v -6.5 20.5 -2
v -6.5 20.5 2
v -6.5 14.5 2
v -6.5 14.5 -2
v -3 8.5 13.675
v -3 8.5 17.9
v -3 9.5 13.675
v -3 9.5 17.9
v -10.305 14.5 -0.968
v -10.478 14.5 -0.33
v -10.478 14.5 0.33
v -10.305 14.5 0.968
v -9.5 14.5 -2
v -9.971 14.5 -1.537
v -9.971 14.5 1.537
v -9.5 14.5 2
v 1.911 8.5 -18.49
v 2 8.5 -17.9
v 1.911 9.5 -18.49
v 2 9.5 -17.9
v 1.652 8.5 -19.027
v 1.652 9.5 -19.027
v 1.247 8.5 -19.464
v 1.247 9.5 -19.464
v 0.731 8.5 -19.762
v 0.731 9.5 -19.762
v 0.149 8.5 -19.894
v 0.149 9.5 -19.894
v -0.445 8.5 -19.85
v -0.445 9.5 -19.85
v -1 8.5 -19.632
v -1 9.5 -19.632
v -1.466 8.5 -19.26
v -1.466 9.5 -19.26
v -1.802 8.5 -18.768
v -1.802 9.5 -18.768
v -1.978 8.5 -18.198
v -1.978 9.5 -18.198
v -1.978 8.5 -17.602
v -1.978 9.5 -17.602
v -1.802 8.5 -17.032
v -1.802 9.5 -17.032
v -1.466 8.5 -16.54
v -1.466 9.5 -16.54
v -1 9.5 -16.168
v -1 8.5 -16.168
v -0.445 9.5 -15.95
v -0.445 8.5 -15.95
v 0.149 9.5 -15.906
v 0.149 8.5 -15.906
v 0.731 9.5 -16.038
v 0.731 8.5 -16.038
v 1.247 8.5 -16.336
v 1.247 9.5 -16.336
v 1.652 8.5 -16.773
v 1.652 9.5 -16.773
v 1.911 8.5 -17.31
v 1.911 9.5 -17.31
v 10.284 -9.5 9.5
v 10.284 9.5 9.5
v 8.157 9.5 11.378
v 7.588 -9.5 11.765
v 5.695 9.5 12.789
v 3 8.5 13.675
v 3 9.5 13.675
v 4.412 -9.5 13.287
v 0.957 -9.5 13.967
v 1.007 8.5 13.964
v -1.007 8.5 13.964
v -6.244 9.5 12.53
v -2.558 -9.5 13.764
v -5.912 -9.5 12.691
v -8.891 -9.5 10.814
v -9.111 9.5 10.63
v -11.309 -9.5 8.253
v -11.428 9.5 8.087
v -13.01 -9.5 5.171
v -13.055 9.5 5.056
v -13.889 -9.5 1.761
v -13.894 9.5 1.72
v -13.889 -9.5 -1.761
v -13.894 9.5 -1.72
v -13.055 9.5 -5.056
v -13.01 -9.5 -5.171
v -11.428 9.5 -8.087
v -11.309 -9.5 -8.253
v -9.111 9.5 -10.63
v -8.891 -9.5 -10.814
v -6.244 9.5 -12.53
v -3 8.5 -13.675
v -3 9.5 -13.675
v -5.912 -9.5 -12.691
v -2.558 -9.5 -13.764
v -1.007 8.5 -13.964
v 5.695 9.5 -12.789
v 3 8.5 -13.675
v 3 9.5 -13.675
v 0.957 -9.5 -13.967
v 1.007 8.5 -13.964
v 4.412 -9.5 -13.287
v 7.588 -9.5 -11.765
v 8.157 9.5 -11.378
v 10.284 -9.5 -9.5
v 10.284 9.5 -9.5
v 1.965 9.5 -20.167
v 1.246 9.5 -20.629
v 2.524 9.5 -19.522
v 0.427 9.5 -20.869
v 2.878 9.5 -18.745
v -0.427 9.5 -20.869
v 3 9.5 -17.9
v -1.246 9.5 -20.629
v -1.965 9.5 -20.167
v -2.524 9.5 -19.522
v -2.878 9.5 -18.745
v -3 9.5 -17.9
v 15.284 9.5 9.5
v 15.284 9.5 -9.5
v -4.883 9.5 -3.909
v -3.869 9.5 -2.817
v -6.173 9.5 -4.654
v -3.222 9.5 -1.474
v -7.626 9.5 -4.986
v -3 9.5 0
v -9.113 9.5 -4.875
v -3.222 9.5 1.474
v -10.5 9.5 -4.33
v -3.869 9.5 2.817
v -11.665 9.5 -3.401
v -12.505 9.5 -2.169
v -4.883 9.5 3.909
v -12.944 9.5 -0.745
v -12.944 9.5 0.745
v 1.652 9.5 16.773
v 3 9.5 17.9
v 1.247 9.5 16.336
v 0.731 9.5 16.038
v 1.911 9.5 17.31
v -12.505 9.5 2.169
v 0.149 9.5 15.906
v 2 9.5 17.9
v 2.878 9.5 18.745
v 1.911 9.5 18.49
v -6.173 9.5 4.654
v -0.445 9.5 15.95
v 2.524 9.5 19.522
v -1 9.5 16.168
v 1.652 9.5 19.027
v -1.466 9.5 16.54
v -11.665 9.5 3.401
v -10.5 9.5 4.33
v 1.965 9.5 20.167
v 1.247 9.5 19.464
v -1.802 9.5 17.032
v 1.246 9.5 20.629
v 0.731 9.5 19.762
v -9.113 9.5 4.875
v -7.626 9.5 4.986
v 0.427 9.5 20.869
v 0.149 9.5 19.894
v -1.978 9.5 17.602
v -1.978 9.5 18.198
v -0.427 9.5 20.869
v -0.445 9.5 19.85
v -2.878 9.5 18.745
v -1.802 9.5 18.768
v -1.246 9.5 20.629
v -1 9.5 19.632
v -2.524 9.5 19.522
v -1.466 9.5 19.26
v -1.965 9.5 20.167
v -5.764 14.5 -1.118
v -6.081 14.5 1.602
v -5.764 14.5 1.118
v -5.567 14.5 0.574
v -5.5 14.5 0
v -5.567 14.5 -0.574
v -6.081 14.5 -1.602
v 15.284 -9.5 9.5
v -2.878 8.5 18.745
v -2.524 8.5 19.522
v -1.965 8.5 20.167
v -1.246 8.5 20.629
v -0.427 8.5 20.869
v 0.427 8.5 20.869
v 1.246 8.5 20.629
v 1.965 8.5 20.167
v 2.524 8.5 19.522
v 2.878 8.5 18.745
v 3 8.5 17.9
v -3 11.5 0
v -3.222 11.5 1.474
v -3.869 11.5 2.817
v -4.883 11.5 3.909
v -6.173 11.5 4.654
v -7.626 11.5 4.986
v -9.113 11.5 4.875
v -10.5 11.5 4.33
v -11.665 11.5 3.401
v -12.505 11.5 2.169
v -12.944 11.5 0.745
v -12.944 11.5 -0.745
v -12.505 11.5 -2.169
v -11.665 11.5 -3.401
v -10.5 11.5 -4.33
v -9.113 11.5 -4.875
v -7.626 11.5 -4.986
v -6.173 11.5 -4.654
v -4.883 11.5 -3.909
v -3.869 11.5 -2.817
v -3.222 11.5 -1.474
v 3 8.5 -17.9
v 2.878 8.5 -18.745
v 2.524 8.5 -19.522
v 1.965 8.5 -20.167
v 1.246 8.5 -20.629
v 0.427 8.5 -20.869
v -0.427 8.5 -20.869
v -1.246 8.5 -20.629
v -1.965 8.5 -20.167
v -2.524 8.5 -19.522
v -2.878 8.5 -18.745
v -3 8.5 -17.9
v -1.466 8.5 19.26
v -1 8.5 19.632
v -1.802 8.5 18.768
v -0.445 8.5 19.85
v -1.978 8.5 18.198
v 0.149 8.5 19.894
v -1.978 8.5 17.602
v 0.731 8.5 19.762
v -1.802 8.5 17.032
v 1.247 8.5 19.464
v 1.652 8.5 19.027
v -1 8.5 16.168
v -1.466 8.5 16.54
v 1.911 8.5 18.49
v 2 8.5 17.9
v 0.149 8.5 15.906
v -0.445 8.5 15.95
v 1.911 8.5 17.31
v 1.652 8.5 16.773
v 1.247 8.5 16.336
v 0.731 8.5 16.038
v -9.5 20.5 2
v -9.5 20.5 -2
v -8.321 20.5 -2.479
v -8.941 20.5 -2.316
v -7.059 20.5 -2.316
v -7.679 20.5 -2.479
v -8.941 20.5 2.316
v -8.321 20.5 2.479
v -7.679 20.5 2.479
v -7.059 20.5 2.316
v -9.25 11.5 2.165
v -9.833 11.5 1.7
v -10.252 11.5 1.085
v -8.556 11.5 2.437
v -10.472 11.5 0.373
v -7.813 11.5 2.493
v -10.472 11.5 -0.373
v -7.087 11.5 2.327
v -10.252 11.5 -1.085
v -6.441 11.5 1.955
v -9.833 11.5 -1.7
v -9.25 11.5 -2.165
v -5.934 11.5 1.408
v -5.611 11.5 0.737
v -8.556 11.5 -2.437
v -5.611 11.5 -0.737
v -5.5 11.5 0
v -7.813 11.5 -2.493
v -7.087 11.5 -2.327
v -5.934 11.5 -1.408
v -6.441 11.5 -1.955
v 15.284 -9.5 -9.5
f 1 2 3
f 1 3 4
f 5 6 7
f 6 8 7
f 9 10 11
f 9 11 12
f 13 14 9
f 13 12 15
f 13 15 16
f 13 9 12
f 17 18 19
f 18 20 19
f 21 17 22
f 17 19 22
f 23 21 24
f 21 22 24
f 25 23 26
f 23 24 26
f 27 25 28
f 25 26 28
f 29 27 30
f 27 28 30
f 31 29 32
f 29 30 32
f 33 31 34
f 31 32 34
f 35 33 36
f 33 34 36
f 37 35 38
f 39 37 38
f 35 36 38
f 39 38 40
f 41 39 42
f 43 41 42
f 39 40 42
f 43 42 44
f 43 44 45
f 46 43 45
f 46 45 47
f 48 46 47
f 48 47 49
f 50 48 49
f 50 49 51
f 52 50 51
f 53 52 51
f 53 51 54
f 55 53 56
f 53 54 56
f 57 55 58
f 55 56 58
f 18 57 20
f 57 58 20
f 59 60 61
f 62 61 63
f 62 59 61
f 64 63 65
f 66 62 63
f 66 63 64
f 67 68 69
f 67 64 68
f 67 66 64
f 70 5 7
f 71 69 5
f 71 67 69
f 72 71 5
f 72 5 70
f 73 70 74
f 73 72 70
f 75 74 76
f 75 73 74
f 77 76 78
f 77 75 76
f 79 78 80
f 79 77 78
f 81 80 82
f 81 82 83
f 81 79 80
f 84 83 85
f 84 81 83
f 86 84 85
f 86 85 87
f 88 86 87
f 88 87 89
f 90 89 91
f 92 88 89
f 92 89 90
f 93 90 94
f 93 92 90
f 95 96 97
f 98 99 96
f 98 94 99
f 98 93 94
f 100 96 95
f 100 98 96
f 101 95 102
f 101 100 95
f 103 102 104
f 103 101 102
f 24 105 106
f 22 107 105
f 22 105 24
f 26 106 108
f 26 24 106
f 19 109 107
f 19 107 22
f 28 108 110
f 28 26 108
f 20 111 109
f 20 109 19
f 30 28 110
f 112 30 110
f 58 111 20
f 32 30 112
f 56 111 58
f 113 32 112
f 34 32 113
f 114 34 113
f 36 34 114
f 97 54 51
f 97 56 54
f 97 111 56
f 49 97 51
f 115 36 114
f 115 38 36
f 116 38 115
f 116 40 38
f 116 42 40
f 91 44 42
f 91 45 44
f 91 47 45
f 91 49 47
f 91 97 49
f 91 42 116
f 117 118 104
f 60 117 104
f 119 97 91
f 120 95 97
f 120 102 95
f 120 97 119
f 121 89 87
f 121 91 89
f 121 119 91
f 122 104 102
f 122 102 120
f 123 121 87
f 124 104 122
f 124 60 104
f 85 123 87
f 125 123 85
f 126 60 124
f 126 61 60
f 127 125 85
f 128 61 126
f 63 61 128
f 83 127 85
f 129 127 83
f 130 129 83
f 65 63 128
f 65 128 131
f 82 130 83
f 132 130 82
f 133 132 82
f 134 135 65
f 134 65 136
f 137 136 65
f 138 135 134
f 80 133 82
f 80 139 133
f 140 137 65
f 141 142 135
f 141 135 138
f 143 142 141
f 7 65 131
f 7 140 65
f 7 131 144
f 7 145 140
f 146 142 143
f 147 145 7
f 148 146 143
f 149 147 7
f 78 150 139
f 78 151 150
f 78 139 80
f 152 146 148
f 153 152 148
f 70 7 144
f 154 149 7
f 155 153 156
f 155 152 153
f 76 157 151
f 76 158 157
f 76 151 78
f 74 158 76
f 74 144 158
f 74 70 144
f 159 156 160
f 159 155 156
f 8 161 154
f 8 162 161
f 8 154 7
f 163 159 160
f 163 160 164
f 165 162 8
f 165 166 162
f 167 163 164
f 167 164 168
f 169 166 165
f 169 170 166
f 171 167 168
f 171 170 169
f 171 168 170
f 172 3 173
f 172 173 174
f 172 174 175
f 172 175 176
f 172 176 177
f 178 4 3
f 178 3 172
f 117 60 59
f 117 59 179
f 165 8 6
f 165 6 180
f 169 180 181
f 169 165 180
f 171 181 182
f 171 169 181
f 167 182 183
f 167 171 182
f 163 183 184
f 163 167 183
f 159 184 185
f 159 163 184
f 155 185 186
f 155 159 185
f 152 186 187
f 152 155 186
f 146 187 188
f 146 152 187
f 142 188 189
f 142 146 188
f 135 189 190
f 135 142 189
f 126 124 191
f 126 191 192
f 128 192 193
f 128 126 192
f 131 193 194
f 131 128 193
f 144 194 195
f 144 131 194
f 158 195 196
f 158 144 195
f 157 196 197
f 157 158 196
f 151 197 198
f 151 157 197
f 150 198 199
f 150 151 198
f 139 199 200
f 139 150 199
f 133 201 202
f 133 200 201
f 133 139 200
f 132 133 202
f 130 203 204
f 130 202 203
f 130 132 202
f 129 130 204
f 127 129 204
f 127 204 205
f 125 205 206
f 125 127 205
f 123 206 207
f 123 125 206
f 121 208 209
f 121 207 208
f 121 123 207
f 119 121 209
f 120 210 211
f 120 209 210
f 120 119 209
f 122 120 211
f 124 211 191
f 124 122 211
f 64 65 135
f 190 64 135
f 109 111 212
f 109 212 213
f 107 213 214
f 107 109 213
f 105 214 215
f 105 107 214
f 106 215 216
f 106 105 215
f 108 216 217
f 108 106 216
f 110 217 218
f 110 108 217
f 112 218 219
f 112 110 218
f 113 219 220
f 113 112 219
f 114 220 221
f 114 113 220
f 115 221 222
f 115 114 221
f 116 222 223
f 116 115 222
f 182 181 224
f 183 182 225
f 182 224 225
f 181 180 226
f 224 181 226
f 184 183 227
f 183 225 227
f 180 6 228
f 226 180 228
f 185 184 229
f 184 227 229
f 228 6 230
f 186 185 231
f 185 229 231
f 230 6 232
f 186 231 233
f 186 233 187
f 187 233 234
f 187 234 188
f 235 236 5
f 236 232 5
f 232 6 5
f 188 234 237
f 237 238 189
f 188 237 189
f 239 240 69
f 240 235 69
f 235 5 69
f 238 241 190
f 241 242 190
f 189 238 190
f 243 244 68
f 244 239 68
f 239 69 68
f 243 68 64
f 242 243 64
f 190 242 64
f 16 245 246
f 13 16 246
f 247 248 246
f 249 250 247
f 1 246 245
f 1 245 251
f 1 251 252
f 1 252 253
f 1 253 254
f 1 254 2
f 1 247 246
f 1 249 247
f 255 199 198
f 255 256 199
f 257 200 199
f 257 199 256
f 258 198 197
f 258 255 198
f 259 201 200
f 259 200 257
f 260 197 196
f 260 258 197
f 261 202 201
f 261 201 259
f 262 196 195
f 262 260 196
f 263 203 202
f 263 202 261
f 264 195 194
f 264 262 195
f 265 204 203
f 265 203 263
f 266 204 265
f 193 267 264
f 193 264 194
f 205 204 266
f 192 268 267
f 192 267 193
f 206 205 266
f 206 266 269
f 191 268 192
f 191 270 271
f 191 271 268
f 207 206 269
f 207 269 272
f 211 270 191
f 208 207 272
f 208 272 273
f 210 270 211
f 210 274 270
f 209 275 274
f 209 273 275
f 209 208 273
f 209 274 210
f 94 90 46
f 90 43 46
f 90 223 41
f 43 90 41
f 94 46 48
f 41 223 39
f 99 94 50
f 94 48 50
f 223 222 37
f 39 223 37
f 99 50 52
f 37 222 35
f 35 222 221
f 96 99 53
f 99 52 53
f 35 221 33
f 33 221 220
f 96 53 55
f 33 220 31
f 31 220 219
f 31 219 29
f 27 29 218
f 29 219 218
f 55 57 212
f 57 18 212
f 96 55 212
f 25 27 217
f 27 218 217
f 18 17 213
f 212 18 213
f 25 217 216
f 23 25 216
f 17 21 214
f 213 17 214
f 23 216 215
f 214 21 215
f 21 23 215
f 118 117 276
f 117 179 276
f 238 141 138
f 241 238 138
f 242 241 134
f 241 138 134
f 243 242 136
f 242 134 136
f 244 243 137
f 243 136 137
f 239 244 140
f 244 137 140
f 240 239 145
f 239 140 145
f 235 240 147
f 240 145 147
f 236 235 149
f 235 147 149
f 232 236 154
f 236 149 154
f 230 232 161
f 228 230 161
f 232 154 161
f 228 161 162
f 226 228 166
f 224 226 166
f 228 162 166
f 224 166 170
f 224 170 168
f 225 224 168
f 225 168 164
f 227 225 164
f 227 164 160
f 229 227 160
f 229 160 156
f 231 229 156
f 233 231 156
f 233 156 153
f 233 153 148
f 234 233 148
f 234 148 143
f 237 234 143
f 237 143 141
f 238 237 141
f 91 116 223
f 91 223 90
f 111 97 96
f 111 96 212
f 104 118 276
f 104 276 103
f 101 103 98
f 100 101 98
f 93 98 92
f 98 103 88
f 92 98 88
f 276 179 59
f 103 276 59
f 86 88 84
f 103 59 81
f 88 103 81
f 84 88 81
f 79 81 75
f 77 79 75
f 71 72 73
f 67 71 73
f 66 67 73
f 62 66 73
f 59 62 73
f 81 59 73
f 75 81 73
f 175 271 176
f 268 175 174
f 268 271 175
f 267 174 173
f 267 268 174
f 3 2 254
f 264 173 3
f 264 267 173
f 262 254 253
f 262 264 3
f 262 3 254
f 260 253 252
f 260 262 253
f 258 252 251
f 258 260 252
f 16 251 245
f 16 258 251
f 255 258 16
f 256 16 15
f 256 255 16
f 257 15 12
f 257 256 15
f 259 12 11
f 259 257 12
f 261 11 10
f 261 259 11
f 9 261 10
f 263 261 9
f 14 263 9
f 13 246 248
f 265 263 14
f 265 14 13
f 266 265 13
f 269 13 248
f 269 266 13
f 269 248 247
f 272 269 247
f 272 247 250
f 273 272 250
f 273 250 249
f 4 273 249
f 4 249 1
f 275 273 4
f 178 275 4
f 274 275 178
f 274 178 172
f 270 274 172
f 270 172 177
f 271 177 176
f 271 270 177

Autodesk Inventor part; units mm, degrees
ref_plane "YZ Plane" through (0, 0, 0) normal (1, 0, 0) x (0, 1, 0)
ref_plane "XZ Plane" through (0, 0, 0) normal (0, 1, 0) x (-1, 0, 0)
ref_plane "XY Plane" through (0, 0, 0) normal (0, 0, 1) x (1, 0, 0)
sketch "Sketch1" plane through (0, 0, 0) normal (0, 1, 0) x (-1, 0, 0)
  circle A0 centre (0, 0) radius 14
  line L0 (-10.2835, 9.5) -> (-15.2835, 9.5)
  line L1 (-15.2835, 9.5) -> (-15.2835, -9.5)
  line L2 (-15.2835, -9.5) -> (-10.2835, -9.5)
  line L3 (-10.2835, -9.5) -> (-10.2835, 9.5)
  point P0 (-10.2835, 0)
  dimension "d0" = 28
  dimension "d3" = 5
  dimension "d4" = 19
extrude "Extrusion1" add sketch "Sketch1" along normal mid plane 19
sketch "Sketch2" plane through (0, 9.5, 0) normal (0, 1, 0) x (1, 0, 0)
  line L0 (0, 0) -> (15.2835, 0) construction
  line L1 (15.2835, -9.5) -> (15.2835, 9.5) projected
  circle A0 centre (0, 17.9) radius 2
  arc A1 (10.2835, 9.5) -> (10.2835, -9.5) centre (0, 0) ccw projected
  line L2 (-3, 13.6748) -> (3, 13.6748)
  line L3 (3, 13.6748) -> (3, 17.9)
  line L4 (3, 17.9) -> (-3, 17.9) construction
  line L5 (-3, 17.9) -> (-3, 13.6748)
  arc A2 (3, 17.9) -> (-3, 17.9) centre (0, 17.9) ccw
  circle A3 centre (0, -17.9) radius 2
  line L6 (-3, -13.6748) -> (3, -13.6748)
  line L7 (3, -13.6748) -> (3, -17.9)
  line L8 (3, -17.9) -> (-3, -17.9) construction
  line L9 (-3, -17.9) -> (-3, -13.6748)
  arc A4 (-3, -17.9) -> (3, -17.9) centre (0, -17.9) ccw
  point P0 (0, 14)
  point P1 (0, 13.6748)
  point P2 (0, -14)
  point P3 (0, -13.6748)
  dimension "d5" = 4
  dimension "d6" = 3.9
  dimension "d7" = 3
extrude "Extrusion2" add sketch "Sketch2" against normal blind 1 contours A1 L7 A4 L9 | A1 L5 A2 L3
sketch "Sketch3" plane through (0, 9.5, 0) normal (0, 1, 0) x (1, 0, 0)
  circle A0 centre (-8, 0) radius 5
  arc A1 (-3, 13.6748) -> (-3, -13.6748) centre (0, 0) ccw projected
  point P0 (-14, 0)
  point P1 (-14, 0)
  dimension "d10" = 10
  dimension "d11" = 6
extrude "Extrusion3" add sketch "Sketch3" along normal blind 2
sketch "Sketch4" plane through (-8, 11.5, 0) normal (0, 1, 0) x (1, 0, 0)
  circle A0 centre (0, 0) radius 2.5
  circle A1 centre (0, 0) radius 5 projected
  point P0 (8, 0)
  dimension "d14" = 5
extrude "Extrusion4" add sketch "Sketch4" along normal blind 9 contours A0
sketch "Sketch5" plane through (-8, 20.5, 0) normal (0, 1, 0) x (1, 0, 0)
  circle A0 centre (0, 0) radius 2.5 projected
  circle A1 centre (0, 0) radius 2.5 projected
  line L0 (1.5, -2) -> (1.5, 2)
  line L1 (0, -2.5) -> (0, 2.5) construction
  line L2 (-1.5, -2) -> (-1.5, 2)
  point P0 (8, 0)
  dimension "d19" = 3
extrude "Extrusion5" cut sketch "Sketch5" against normal blind 6 contours A0 L0 | L2 A0
properties part number "smol stepper"
